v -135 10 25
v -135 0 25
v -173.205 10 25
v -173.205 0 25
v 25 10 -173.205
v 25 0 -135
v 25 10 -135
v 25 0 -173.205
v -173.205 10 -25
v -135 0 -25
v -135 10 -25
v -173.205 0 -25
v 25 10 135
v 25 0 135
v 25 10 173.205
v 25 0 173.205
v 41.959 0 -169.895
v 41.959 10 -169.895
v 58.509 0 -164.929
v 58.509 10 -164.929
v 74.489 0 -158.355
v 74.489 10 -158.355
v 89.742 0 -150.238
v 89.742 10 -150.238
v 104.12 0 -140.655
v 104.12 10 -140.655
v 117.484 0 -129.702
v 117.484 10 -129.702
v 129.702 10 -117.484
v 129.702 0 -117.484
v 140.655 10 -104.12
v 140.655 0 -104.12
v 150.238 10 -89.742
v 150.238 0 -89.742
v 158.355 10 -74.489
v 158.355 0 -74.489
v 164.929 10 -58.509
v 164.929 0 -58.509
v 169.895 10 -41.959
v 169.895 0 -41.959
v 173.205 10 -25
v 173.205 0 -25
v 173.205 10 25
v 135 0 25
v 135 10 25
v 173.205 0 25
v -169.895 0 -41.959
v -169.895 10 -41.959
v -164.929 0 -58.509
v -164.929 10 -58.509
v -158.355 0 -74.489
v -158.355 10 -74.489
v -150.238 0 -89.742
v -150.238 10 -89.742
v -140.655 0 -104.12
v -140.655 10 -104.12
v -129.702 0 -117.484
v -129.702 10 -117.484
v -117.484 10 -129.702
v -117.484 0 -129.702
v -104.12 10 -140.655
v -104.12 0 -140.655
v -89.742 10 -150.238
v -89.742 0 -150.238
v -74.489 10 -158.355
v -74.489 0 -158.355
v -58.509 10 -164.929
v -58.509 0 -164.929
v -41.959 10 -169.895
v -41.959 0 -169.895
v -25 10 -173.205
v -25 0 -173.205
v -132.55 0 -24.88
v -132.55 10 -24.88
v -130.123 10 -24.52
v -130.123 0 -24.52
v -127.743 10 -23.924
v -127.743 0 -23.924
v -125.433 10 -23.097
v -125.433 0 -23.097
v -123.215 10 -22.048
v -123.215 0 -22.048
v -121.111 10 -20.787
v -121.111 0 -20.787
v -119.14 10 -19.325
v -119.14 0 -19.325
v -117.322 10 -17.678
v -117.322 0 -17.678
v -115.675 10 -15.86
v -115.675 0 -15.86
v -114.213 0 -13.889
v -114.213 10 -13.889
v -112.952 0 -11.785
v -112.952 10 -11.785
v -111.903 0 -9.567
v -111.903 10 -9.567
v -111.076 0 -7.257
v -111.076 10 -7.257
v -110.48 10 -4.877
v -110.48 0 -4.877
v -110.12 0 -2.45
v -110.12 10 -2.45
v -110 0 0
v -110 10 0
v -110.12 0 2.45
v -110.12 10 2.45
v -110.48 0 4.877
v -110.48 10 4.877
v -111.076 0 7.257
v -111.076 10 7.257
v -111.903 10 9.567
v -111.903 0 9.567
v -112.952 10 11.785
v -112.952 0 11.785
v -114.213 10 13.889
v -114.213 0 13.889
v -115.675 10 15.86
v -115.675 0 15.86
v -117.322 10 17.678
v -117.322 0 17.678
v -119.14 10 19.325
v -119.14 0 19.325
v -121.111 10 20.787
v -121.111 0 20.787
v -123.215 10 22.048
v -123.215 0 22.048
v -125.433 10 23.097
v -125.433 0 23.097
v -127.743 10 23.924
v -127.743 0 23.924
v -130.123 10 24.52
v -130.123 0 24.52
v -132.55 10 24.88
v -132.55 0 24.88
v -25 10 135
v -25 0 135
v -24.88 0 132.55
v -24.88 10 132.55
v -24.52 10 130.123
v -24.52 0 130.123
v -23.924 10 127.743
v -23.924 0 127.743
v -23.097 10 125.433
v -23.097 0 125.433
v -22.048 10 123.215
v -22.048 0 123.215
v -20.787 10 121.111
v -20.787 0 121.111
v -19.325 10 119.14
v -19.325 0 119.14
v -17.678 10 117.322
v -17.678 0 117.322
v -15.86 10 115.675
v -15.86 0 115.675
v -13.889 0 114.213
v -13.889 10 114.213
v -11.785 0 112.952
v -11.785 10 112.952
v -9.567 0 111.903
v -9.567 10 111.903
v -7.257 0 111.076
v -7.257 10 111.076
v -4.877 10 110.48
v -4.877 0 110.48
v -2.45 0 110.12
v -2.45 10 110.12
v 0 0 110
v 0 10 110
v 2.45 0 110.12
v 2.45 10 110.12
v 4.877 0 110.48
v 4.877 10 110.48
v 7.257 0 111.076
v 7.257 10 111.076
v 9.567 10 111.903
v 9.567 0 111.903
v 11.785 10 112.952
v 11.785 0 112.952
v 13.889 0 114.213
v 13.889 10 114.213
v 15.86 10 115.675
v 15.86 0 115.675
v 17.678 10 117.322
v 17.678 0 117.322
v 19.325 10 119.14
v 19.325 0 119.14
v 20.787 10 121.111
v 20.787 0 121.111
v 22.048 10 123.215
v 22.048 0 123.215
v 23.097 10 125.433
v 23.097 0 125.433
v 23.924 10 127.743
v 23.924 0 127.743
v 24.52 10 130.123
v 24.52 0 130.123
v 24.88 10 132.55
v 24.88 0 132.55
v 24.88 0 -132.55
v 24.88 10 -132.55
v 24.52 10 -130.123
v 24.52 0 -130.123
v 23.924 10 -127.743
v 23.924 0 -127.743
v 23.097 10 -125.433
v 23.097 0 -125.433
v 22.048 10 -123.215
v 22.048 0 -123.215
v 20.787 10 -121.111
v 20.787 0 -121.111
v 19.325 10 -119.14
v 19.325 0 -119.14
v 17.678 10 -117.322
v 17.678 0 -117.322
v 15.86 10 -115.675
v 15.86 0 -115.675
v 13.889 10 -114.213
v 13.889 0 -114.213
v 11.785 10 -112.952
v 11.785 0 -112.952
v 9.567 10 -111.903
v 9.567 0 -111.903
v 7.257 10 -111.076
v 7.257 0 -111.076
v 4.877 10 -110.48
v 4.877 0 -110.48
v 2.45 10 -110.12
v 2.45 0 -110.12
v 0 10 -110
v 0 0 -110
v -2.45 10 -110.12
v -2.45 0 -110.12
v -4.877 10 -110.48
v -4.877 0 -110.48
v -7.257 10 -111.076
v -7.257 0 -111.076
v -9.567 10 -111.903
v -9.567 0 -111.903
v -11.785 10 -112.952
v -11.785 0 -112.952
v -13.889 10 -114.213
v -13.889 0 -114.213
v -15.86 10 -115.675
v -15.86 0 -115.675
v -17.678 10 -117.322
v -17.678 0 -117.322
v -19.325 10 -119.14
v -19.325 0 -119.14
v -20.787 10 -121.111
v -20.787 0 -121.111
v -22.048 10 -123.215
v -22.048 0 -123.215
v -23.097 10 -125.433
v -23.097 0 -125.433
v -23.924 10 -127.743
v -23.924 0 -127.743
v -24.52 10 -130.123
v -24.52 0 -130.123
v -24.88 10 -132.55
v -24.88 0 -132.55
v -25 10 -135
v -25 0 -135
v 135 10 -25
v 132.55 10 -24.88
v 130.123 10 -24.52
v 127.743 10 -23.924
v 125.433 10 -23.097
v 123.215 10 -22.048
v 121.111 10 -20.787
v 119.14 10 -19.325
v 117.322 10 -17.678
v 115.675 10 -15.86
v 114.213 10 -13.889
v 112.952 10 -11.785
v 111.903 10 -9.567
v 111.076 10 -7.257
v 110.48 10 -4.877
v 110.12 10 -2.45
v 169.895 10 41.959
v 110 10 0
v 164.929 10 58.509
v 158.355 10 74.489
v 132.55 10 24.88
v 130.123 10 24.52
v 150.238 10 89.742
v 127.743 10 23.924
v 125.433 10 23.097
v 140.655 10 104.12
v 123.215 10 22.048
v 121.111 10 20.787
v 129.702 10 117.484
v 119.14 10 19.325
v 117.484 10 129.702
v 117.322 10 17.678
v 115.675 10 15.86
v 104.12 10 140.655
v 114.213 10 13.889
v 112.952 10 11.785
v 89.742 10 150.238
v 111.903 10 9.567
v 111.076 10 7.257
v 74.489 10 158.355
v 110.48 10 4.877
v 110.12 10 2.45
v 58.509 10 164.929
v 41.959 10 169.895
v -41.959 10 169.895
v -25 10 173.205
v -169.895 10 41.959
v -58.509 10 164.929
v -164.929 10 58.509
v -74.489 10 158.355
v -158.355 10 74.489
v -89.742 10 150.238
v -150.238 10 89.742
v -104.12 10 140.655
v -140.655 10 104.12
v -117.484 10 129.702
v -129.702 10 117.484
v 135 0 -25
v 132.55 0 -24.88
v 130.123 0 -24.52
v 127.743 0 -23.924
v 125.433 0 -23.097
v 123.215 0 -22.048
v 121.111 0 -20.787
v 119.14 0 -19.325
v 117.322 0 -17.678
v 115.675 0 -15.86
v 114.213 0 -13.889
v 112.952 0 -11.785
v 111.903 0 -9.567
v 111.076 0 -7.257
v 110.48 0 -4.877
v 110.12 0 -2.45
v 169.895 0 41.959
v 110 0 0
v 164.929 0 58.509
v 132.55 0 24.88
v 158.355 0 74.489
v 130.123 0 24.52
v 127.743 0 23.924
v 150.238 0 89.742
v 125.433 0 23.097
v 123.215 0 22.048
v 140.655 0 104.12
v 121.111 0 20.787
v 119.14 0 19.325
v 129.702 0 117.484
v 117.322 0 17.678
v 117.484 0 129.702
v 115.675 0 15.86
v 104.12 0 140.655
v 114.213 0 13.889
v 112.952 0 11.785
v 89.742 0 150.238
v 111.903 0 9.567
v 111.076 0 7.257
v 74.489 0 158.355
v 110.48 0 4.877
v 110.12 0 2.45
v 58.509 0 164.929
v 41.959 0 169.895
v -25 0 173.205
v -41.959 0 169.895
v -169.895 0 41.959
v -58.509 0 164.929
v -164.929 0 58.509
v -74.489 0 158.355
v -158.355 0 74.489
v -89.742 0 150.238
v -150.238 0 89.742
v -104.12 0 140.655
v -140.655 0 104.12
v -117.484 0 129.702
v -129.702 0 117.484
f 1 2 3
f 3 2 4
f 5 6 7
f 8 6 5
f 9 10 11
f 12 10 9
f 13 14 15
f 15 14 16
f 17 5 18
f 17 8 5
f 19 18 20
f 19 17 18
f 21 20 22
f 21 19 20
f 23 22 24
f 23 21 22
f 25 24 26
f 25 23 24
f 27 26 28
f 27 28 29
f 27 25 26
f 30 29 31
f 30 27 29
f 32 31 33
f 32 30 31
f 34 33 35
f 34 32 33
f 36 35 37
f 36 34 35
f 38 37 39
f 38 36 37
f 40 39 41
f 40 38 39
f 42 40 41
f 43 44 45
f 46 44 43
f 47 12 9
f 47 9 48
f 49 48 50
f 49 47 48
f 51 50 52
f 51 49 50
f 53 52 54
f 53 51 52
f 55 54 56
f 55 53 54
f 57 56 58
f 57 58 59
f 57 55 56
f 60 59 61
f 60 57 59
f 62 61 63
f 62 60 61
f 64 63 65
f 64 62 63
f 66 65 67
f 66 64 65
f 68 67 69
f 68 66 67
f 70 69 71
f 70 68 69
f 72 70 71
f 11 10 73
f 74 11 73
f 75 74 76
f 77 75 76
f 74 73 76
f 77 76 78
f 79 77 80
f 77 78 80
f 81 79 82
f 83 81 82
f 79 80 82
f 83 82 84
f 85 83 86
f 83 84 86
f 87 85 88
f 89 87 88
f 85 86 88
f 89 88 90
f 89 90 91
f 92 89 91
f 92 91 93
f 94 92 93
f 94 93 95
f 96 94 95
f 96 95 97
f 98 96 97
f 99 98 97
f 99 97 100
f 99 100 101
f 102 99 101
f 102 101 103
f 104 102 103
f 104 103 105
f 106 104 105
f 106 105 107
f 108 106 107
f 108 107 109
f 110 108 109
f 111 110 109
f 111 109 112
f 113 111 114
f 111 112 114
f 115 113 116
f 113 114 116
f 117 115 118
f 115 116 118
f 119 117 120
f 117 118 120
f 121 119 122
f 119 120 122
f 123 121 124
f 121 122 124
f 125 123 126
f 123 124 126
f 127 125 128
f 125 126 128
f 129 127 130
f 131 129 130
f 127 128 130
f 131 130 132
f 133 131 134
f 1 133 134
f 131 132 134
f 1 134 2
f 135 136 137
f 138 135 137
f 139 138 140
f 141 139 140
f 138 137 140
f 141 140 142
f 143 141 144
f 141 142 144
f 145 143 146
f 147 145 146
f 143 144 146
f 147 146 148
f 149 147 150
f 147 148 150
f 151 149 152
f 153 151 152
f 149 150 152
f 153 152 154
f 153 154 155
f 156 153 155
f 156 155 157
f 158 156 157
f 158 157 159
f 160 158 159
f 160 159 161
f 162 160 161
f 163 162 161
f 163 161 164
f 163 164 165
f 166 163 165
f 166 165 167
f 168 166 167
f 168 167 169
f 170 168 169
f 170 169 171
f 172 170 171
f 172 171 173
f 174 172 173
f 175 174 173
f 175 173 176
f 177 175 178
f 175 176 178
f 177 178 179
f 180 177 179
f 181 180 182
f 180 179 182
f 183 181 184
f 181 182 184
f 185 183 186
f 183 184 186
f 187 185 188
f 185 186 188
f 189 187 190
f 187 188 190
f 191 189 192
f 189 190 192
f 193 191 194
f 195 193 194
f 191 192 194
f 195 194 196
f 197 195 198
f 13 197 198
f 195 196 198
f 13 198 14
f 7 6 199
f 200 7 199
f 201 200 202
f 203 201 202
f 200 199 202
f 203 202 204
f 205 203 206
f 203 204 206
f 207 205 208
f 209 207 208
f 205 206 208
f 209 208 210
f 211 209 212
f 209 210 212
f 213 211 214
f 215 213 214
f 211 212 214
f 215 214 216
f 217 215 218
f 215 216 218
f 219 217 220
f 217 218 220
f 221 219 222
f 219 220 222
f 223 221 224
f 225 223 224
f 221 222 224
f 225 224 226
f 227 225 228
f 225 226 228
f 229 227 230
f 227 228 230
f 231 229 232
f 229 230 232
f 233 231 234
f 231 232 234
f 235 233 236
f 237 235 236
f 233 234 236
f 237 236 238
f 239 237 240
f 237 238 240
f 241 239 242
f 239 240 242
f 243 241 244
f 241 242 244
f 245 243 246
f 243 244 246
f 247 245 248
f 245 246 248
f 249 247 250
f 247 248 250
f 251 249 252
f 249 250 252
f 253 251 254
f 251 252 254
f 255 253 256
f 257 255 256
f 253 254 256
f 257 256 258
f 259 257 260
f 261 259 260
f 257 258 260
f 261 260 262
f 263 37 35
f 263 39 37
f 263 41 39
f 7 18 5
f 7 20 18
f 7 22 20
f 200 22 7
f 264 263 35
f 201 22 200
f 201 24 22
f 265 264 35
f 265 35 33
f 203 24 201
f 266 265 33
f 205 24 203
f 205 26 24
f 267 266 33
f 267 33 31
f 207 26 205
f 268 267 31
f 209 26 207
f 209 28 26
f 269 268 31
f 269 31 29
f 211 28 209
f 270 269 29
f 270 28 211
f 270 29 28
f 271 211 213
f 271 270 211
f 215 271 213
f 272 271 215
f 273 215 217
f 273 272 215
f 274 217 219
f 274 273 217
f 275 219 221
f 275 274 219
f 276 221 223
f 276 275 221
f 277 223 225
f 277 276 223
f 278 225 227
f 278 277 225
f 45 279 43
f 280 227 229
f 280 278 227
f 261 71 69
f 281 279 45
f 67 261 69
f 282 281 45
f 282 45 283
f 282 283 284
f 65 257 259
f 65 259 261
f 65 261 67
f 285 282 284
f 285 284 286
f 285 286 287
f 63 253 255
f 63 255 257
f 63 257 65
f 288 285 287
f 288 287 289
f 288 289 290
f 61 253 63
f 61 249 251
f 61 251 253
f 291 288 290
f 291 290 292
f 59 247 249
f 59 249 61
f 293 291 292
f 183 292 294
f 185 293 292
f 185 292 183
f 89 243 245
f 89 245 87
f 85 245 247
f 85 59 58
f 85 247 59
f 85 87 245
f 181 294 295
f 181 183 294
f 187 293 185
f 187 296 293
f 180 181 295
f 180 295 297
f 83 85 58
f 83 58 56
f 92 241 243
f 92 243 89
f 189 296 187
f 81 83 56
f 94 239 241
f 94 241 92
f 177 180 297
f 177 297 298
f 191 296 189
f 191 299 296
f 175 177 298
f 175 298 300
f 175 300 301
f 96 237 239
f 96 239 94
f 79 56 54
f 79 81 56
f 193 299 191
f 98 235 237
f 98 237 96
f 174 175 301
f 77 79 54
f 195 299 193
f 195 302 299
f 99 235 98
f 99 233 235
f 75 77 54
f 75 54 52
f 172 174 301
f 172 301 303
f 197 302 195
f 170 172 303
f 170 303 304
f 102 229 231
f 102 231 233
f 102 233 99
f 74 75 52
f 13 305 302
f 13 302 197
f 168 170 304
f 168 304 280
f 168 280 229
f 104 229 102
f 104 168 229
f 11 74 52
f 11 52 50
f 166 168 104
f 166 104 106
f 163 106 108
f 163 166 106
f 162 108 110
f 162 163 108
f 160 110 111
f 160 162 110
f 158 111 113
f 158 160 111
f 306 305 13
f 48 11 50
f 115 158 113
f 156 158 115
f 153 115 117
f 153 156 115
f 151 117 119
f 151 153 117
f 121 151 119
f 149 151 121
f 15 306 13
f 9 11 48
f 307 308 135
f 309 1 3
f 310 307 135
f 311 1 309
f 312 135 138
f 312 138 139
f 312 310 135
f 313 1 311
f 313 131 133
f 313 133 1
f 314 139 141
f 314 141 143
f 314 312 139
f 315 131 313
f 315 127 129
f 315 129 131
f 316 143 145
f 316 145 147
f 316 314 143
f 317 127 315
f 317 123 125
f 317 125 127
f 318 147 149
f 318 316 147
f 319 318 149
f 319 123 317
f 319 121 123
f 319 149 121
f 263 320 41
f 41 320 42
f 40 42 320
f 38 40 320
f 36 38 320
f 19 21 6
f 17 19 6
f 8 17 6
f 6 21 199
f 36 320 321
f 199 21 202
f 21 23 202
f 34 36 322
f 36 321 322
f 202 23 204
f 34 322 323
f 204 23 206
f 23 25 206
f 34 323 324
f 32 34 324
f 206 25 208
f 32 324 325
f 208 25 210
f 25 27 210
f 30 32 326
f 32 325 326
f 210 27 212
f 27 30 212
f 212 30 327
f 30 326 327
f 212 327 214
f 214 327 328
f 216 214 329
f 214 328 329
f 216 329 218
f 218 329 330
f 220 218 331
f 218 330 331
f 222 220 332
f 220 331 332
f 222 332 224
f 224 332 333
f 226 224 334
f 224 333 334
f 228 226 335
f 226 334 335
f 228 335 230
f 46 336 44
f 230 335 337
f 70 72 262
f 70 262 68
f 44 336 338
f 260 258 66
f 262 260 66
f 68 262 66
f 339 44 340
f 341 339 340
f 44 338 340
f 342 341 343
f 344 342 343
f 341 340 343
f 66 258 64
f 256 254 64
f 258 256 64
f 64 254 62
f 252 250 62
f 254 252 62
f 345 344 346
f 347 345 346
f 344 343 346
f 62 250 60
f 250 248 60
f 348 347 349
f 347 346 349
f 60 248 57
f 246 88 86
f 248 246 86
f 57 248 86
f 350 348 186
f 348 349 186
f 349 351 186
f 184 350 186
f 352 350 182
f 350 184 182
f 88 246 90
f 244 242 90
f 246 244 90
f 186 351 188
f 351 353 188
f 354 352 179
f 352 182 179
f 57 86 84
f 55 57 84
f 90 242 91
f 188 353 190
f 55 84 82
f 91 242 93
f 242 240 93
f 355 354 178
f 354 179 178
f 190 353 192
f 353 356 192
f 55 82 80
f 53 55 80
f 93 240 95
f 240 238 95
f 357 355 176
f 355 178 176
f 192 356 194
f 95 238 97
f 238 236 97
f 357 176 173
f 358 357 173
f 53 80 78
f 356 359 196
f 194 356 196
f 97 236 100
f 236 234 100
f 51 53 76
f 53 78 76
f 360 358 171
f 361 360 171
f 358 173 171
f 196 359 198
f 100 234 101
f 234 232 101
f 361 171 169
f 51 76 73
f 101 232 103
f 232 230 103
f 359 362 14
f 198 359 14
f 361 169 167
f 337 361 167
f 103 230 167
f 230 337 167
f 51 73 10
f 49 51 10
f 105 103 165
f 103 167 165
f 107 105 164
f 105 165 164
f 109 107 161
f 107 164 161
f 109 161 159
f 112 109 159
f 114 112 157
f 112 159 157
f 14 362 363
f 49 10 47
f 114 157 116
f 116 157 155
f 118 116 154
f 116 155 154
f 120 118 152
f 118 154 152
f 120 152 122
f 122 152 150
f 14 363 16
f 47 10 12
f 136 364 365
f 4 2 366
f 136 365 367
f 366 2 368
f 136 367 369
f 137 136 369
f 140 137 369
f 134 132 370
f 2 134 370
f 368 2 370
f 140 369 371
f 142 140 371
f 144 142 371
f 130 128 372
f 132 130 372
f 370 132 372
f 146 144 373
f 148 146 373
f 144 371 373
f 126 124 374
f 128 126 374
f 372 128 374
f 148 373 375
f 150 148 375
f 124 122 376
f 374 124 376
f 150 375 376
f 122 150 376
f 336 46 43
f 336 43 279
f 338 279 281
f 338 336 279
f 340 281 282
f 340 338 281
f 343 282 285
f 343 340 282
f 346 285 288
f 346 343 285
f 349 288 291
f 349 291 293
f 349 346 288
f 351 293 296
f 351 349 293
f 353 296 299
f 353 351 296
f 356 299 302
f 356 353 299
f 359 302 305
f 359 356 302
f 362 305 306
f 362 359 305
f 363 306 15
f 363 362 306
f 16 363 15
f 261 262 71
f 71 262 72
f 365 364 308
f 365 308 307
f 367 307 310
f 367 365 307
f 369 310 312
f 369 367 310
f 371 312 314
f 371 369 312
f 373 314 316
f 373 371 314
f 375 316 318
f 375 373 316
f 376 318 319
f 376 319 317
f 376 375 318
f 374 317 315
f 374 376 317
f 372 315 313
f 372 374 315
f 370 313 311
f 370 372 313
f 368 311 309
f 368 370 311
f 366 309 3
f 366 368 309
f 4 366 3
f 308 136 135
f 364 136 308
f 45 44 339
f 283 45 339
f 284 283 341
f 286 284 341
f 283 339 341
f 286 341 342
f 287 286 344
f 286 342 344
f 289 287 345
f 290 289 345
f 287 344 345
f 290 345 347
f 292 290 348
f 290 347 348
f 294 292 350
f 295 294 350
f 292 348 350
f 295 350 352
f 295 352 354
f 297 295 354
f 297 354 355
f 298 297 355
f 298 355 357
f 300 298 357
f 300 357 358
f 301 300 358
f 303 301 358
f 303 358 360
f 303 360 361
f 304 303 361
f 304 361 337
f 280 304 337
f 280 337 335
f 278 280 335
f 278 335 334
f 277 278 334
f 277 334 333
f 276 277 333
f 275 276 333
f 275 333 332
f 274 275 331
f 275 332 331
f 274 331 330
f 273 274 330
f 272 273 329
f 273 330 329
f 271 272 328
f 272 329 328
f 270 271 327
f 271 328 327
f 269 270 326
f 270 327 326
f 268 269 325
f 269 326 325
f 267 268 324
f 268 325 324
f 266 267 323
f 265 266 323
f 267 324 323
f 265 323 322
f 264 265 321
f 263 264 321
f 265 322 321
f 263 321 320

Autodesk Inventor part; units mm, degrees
ref_plane "YZ Plane" through (0, 0, 0) normal (1, 0, 0) x (0, 1, 0)
ref_plane "XZ Plane" through (0, 0, 0) normal (0, 1, 0) x (-1, 0, 0)
ref_plane "XY Plane" through (0, 0, 0) normal (0, 0, 1) x (1, 0, 0)
sketch "Sketch1" plane through (0, 0, 0) normal (0, 1, 0) x (-1, 0, 0)
  circle A0 centre (0, 0) radius 175
  dimension "d0" = 350
extrude "Extrusion1" add sketch "Sketch1" along normal blind 10
sketch "Sketch2" plane through (0, 0, 0) normal (0, -1, 0) x (1, 0, 0)
  circle A0 centre (0, 0) radius 175 projected
  circle A1 centre (0, 135) radius 25
  line L0 (-25, 135) -> (-25, 173.2051)
  line L1 (25, 135) -> (25, 173.2051)
  dimension "d3" = 50
  dimension "d4" = 135
extrude "Extrusion2" cut sketch "Sketch2" against normal through all contours L1 A1 L0 A0 | A1 picked at (-14.0746, 168.7936)
pattern_circular "Circular Pattern1" count 4 over 360 about axis through (0, 0, 0) along (0, 1, 0) of "Extrusion2"
properties part number "Base" material "Steel"
